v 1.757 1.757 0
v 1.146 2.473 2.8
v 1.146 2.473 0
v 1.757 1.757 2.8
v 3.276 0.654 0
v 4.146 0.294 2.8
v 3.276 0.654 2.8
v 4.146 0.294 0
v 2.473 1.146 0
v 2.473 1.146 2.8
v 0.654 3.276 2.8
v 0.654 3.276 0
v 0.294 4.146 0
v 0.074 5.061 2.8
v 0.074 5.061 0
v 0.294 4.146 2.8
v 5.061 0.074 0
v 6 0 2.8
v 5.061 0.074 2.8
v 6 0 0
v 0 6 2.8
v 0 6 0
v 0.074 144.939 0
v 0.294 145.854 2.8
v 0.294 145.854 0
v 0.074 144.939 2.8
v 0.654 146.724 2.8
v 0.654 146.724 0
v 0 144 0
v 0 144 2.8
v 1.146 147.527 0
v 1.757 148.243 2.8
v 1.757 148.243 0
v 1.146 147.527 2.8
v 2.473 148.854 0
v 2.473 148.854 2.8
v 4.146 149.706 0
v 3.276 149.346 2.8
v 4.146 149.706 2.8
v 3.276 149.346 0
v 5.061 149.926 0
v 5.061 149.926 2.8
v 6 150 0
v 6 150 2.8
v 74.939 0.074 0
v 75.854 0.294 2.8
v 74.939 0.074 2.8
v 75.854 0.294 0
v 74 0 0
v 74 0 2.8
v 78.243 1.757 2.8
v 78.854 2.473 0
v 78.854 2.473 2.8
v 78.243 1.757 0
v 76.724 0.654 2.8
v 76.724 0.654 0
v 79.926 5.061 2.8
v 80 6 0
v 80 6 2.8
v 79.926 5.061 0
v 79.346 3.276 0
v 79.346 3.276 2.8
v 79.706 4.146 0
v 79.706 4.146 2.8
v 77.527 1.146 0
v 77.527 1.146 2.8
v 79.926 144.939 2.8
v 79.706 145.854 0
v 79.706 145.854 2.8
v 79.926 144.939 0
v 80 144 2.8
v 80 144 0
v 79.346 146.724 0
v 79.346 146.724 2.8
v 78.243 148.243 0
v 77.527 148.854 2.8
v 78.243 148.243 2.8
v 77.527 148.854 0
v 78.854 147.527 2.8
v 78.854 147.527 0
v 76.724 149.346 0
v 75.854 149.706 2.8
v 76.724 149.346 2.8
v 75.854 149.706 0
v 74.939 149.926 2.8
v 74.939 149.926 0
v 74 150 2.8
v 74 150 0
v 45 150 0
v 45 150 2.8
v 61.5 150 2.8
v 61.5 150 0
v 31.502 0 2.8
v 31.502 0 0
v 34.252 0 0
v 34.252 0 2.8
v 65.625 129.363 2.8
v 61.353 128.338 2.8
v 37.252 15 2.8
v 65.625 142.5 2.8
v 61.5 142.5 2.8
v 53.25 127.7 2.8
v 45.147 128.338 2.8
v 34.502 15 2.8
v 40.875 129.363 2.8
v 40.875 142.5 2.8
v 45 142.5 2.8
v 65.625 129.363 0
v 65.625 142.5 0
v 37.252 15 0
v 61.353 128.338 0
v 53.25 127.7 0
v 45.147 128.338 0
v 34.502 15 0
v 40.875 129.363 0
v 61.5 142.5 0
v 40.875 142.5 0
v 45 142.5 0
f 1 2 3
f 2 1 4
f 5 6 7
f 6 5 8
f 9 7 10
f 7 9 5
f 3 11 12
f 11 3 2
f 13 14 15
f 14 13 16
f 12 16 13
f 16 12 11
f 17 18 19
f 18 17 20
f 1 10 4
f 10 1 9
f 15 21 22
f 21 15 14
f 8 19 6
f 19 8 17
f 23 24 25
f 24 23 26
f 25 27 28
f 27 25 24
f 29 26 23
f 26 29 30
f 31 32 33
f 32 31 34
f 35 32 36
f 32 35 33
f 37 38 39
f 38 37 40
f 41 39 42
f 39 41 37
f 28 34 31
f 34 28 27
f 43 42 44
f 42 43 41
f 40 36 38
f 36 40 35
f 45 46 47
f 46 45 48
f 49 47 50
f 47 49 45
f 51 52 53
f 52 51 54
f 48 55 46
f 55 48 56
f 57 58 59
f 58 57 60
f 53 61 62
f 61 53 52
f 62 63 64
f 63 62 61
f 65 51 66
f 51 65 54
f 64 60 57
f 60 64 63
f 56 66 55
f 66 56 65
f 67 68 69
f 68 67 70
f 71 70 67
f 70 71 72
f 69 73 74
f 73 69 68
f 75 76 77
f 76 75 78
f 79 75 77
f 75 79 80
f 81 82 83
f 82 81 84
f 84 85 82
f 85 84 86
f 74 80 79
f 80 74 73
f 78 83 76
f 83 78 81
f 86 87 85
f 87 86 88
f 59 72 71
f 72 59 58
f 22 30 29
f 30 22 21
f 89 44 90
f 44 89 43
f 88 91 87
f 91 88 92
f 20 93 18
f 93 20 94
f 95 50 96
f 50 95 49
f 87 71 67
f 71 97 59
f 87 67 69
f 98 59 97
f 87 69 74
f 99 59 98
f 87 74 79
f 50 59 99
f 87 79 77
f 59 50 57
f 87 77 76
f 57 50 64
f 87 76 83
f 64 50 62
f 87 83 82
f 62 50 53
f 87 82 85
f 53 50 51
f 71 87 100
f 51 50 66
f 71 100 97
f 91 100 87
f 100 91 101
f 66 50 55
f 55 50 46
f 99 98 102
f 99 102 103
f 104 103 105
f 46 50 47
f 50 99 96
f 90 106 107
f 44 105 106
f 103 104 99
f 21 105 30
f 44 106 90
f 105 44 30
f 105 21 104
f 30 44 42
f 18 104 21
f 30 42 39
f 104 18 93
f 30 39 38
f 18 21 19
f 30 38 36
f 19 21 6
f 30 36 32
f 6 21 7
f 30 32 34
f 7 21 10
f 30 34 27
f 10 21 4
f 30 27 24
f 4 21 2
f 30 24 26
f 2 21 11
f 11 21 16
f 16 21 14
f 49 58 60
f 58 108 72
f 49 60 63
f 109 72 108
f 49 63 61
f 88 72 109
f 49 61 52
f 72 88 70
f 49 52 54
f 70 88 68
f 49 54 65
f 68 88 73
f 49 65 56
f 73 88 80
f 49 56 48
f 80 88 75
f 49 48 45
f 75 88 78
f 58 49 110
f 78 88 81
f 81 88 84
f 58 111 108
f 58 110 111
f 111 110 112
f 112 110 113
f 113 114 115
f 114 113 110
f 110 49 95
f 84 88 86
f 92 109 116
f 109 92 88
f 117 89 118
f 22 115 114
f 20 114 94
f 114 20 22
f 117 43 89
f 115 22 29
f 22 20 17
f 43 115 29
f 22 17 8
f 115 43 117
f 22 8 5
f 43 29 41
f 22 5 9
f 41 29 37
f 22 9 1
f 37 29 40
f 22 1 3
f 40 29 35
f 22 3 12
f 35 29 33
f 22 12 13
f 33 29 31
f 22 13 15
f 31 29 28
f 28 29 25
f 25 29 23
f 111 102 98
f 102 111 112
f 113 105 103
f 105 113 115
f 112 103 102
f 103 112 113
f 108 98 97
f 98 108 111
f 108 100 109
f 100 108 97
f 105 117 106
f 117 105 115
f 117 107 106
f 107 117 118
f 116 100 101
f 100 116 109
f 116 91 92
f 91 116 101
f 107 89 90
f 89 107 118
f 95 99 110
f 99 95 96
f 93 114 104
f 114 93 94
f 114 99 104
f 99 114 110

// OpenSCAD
paddle_width = 80;
paddle_height = 150;
paddle_thickness = 2.8;

corner_radius = 6;

outer_cutout_width = 16.5;
outer_cutout_depth = 7.5;

wheel_width = 24.75;
wheel_depth_outer = 13.3;
wheel_depth_inner = 14.8;

wheel_offset_from_right = 26.75;

spoke_cutout_thickness = 2.75;
spoke_cutout_depth = 15;
spoke_cutout_position_outer = 31.5;
spoke_cutout_position_inner = 34.5;

difference()
{
  intersection()
  {
    // Main body
    cube([paddle_width, paddle_height, paddle_thickness]);

    // Rounded corners
    union()
    {
      for (x = [corner_radius, paddle_width - corner_radius])
        for (y = [corner_radius, paddle_height - corner_radius])
          translate([x, y, -0.5])
          cylinder(paddle_thickness + 1, corner_radius, corner_radius, $fn = 40);
        
      translate([0, corner_radius, -1])
      cube([paddle_width, paddle_height - 2 * corner_radius, paddle_thickness + 2]);
      translate([corner_radius, 0, -1])
      cube([paddle_width - 2 * corner_radius, paddle_height, paddle_thickness + 2]);
    }
  }
  // Outer cutout
  translate([paddle_width - outer_cutout_width * 0.5 - wheel_offset_from_right, paddle_height - outer_cutout_depth - 0.01, -0.5])
  cube([outer_cutout_width, outer_cutout_depth + 1, paddle_height + 1]);
  
  // a = h + q
  // b = i + q
  //
  // a = sqrt(m^2 + b^2)
  //   = sqrt(m^2 + i^2 + 2iq + q^2)
  //   = sqrt(C + 2iq + q^2)
  // C = m^2 + i^2
  // q^2 + 2iq + C = a^2
  // q = a - h
  // (a - h)^2 + 2i(a - h) + C = a^2
  // a^2 - 2ah + h^2 + 2ia - 2ih + C = a^2
  // -2ah + h^2 + 2ia - 2ih + C = 0
  // -2ah + 2ia = -h^2 + 2ih - C
  // a(2i - 2h) = -h^2 + 2ih - C
  // a = (-h^2 + 2ih - (m^2 + i^2)) / (2i - 2h)
  
  wheel_rounding_radius = (-wheel_depth_inner * wheel_depth_inner + 2 * wheel_depth_outer * wheel_depth_inner
    - (0.25 * wheel_width * wheel_width + wheel_depth_outer * wheel_depth_outer))
    / (2 * wheel_depth_outer - 2 * wheel_depth_inner);

  wheel_inner_y = paddle_height - outer_cutout_depth - wheel_depth_inner;

  wheel_circle_y = wheel_inner_y + wheel_rounding_radius;
  
  intersection()
  {
    // Wheel inner edge rounding
    translate([paddle_width - wheel_offset_from_right, wheel_circle_y, -0.5 * paddle_thickness])
    cylinder(2 * paddle_thickness, wheel_rounding_radius, wheel_rounding_radius, $fn = 40);
    
    // Clamp to size of wheel
    translate([paddle_width - wheel_offset_from_right - 0.5 * wheel_width, wheel_inner_y, -paddle_thickness])
    cube([wheel_width, wheel_depth_inner, 3 * paddle_thickness]);
  }
  
  // Spoke cutout
  // In spoke_cutout_depth y units, we need x to shift by (spoke_cutout_position_inner - spoke_cutout_position_outer).
  slant = (spoke_cutout_position_inner - spoke_cutout_position_outer) / spoke_cutout_depth;
  
  translate([spoke_cutout_position_outer, -0.01, -1.5 * paddle_thickness])
  multmatrix(
    [[1, slant, 0, 0],
     [0, 1, 0, 0],
     [0, 0, 1, 0],
     [0, 0, 0, 1]])
  cube([spoke_cutout_thickness, spoke_cutout_depth + 0.01, 4 * paddle_thickness]);
}
